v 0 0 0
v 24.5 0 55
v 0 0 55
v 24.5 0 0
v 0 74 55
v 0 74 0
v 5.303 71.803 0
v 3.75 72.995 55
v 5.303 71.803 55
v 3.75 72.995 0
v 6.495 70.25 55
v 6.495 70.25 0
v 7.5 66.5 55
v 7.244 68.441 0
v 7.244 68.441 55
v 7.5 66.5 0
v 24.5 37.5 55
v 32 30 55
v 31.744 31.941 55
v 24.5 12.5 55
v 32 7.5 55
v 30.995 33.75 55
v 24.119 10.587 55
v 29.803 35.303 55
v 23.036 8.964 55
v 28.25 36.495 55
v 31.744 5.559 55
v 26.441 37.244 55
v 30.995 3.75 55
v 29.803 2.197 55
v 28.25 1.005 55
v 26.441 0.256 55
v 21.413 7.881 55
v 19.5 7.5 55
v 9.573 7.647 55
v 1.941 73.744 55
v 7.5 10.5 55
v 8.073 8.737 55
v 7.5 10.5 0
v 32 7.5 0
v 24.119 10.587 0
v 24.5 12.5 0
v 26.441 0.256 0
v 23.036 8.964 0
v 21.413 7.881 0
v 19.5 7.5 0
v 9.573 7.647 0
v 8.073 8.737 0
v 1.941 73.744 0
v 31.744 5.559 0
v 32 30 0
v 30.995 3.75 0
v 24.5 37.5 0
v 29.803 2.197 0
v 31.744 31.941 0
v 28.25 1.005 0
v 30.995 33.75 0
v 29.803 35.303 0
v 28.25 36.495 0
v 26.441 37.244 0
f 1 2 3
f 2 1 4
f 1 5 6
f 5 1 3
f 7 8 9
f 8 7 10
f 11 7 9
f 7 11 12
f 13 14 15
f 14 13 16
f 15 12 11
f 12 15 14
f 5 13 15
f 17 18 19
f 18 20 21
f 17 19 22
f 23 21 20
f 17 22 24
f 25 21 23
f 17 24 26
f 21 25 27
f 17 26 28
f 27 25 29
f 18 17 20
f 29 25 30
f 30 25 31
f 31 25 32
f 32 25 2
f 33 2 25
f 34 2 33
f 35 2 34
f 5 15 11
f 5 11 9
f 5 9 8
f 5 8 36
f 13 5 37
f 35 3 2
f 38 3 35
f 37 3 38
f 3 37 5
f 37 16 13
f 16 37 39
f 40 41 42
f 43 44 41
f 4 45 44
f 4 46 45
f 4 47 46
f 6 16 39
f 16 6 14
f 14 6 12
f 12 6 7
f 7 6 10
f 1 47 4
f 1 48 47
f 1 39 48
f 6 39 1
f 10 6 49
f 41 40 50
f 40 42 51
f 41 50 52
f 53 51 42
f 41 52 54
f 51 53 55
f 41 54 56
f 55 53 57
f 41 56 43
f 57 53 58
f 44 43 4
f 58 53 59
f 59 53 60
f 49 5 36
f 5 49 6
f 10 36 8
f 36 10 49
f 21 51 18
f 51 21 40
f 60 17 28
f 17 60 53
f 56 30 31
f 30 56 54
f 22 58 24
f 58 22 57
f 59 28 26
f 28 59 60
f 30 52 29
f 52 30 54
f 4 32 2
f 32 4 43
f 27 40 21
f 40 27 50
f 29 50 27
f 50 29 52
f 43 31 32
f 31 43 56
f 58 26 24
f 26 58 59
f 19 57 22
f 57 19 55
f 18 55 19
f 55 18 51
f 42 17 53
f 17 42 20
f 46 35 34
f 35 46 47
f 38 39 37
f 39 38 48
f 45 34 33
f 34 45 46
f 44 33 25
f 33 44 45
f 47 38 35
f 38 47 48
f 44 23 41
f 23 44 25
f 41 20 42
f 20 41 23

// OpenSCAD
wall_thickness = 7.5;
height_back = 74; // height of back of hook as it touches the mounting surface
depth = 17; // wall-to-wall internal depth
height_front = 30; // from bottom of inner bracket to top of hook
width = 55;

//$fn=360;

r = wall_thickness;
 // radii of inside space. r or r/2 are sensible defaults
inner_bl_r = 3;
inner_br_r = 5;

module corner(r_=wall_thickness, w=width) {
    intersection() {
        cylinder(r=r_, h=w);
        cube([r_,r_,w]);
    }
}

module ul() { translate([0,height_back-r,0]) corner(); }
module bl() { translate([0,0,0]) rotate(0) corner(); }
module br() { translate([depth+r,r,0]) rotate(270) corner(); }
module ur() { translate([depth+r,height_front,0]) corner(); }

module inside() {
    translate([0,0,-0.001])
    hull() {
        translate([r+inner_bl_r,r+inner_bl_r,0]) rotate(180) corner(r_=inner_bl_r,w=width+0.002);
        translate([depth+(r-inner_br_r),r+inner_br_r,0]) rotate(270) corner(r_=inner_br_r, w=width+0.002);
        translate([2*r,height_back-r,0]) rotate(90) corner(w=width+0.002);
        translate([depth,height_back-r,0]) corner(w=width+0.002);
    }
}

module bracket() {
    difference() {
        union() {
            hull() {
                ul(); bl();
            }
            hull() {
                translate([-depth-r,0,0]) ur();
                bl(); br(); ur();
            }
        }
        inside();
    }
}

bracket();
